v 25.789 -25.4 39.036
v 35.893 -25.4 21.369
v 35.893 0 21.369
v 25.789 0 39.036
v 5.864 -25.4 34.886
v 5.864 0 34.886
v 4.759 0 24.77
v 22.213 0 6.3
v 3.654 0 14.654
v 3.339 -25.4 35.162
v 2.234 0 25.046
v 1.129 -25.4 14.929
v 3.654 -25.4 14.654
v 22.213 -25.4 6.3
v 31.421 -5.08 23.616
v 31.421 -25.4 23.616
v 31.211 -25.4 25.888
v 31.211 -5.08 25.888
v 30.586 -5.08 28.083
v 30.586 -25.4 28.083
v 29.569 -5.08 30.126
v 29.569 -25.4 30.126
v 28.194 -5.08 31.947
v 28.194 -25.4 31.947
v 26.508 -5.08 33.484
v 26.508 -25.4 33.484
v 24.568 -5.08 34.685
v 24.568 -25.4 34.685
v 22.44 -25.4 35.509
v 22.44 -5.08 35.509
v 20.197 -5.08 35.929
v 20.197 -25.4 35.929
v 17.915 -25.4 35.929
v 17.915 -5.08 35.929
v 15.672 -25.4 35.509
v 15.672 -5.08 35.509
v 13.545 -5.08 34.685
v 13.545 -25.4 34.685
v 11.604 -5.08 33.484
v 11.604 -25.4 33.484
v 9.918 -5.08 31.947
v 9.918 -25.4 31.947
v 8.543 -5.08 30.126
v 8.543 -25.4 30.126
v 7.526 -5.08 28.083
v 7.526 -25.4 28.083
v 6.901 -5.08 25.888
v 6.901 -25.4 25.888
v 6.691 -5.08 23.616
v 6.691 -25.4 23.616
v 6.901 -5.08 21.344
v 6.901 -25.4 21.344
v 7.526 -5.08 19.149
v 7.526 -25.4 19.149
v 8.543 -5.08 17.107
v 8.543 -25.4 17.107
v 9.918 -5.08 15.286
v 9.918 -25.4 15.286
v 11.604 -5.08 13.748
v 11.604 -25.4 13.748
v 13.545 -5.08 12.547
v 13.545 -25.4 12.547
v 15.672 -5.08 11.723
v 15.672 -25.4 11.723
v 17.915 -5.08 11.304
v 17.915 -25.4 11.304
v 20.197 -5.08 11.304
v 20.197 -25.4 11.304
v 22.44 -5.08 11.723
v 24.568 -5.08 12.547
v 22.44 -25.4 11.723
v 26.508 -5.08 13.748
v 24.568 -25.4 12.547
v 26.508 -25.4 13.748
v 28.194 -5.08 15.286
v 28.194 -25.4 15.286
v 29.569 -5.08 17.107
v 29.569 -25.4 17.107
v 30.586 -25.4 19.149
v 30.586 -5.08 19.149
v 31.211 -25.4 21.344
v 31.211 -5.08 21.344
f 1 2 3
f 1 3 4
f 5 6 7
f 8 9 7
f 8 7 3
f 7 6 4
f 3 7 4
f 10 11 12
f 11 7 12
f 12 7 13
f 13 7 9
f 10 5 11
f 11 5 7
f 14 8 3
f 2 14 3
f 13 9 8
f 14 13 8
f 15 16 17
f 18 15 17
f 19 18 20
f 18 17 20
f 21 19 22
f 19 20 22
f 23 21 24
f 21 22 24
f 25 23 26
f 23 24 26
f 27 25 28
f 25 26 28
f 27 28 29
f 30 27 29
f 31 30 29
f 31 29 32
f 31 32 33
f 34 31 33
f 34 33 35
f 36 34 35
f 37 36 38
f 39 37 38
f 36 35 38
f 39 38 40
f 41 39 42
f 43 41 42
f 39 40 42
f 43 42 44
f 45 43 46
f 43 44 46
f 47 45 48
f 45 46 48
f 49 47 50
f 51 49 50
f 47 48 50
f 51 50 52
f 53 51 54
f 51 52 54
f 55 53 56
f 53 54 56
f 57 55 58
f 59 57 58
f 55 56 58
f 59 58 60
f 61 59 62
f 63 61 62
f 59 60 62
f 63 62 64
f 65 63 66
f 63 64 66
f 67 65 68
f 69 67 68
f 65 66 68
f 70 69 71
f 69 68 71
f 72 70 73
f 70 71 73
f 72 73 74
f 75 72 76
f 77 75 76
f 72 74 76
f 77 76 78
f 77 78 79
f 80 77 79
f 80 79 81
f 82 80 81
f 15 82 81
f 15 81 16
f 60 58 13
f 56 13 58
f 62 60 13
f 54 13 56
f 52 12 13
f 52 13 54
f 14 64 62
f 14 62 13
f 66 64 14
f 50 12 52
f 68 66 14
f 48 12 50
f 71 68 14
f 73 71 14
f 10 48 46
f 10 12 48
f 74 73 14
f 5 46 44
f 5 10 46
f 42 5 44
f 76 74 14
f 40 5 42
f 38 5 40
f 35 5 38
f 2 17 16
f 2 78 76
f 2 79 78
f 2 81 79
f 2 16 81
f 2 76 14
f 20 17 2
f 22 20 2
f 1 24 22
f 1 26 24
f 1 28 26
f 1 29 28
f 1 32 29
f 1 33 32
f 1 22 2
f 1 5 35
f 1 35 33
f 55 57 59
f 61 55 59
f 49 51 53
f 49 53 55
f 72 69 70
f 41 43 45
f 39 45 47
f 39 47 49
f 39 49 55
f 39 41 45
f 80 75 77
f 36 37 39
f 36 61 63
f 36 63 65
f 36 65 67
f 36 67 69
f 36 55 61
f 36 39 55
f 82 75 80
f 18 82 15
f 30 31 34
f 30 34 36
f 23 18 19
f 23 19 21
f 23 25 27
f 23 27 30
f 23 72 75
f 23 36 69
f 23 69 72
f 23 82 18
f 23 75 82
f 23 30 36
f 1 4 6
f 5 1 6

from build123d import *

# Parameters (mm, degrees)
F1_DEPTH = 25.4
F2_R     = 12.365241
F3_DEPTH = 20.32
F5_DEPTH = 2.54


with BuildPart() as f1:
    # F0 (on Front) → F1 (new body)
    with BuildSketch(Plane.XZ):
        Polygon((22.213069, 6.299807), (35.893104, 21.369218), (25.788605, 39.036409), (5.863647, 34.885922), (3.653844, 14.653589), align=None)
    extrude(amount=F1_DEPTH)

    # F2 (on face) → F3 (cut)
    with BuildSketch(Plane.XZ.offset(25.4)):
        with Locations((19.056195, 23.6161)):
            Circle(F2_R)
    extrude(amount=-F3_DEPTH, mode=Mode.SUBTRACT)

    # F4 (on face) → F5 (join)
    with BuildSketch(Plane(origin=(2.029152, 0, -0.221627), x_dir=(0, -1, 0), z_dir=(-0.994088, 0, 0.108576))):
        Polygon((25.4, 14.963679), (25.4, 35.316332), (0, 25.140005), align=None)
    extrude(amount=F5_DEPTH)


solid = f1.part
